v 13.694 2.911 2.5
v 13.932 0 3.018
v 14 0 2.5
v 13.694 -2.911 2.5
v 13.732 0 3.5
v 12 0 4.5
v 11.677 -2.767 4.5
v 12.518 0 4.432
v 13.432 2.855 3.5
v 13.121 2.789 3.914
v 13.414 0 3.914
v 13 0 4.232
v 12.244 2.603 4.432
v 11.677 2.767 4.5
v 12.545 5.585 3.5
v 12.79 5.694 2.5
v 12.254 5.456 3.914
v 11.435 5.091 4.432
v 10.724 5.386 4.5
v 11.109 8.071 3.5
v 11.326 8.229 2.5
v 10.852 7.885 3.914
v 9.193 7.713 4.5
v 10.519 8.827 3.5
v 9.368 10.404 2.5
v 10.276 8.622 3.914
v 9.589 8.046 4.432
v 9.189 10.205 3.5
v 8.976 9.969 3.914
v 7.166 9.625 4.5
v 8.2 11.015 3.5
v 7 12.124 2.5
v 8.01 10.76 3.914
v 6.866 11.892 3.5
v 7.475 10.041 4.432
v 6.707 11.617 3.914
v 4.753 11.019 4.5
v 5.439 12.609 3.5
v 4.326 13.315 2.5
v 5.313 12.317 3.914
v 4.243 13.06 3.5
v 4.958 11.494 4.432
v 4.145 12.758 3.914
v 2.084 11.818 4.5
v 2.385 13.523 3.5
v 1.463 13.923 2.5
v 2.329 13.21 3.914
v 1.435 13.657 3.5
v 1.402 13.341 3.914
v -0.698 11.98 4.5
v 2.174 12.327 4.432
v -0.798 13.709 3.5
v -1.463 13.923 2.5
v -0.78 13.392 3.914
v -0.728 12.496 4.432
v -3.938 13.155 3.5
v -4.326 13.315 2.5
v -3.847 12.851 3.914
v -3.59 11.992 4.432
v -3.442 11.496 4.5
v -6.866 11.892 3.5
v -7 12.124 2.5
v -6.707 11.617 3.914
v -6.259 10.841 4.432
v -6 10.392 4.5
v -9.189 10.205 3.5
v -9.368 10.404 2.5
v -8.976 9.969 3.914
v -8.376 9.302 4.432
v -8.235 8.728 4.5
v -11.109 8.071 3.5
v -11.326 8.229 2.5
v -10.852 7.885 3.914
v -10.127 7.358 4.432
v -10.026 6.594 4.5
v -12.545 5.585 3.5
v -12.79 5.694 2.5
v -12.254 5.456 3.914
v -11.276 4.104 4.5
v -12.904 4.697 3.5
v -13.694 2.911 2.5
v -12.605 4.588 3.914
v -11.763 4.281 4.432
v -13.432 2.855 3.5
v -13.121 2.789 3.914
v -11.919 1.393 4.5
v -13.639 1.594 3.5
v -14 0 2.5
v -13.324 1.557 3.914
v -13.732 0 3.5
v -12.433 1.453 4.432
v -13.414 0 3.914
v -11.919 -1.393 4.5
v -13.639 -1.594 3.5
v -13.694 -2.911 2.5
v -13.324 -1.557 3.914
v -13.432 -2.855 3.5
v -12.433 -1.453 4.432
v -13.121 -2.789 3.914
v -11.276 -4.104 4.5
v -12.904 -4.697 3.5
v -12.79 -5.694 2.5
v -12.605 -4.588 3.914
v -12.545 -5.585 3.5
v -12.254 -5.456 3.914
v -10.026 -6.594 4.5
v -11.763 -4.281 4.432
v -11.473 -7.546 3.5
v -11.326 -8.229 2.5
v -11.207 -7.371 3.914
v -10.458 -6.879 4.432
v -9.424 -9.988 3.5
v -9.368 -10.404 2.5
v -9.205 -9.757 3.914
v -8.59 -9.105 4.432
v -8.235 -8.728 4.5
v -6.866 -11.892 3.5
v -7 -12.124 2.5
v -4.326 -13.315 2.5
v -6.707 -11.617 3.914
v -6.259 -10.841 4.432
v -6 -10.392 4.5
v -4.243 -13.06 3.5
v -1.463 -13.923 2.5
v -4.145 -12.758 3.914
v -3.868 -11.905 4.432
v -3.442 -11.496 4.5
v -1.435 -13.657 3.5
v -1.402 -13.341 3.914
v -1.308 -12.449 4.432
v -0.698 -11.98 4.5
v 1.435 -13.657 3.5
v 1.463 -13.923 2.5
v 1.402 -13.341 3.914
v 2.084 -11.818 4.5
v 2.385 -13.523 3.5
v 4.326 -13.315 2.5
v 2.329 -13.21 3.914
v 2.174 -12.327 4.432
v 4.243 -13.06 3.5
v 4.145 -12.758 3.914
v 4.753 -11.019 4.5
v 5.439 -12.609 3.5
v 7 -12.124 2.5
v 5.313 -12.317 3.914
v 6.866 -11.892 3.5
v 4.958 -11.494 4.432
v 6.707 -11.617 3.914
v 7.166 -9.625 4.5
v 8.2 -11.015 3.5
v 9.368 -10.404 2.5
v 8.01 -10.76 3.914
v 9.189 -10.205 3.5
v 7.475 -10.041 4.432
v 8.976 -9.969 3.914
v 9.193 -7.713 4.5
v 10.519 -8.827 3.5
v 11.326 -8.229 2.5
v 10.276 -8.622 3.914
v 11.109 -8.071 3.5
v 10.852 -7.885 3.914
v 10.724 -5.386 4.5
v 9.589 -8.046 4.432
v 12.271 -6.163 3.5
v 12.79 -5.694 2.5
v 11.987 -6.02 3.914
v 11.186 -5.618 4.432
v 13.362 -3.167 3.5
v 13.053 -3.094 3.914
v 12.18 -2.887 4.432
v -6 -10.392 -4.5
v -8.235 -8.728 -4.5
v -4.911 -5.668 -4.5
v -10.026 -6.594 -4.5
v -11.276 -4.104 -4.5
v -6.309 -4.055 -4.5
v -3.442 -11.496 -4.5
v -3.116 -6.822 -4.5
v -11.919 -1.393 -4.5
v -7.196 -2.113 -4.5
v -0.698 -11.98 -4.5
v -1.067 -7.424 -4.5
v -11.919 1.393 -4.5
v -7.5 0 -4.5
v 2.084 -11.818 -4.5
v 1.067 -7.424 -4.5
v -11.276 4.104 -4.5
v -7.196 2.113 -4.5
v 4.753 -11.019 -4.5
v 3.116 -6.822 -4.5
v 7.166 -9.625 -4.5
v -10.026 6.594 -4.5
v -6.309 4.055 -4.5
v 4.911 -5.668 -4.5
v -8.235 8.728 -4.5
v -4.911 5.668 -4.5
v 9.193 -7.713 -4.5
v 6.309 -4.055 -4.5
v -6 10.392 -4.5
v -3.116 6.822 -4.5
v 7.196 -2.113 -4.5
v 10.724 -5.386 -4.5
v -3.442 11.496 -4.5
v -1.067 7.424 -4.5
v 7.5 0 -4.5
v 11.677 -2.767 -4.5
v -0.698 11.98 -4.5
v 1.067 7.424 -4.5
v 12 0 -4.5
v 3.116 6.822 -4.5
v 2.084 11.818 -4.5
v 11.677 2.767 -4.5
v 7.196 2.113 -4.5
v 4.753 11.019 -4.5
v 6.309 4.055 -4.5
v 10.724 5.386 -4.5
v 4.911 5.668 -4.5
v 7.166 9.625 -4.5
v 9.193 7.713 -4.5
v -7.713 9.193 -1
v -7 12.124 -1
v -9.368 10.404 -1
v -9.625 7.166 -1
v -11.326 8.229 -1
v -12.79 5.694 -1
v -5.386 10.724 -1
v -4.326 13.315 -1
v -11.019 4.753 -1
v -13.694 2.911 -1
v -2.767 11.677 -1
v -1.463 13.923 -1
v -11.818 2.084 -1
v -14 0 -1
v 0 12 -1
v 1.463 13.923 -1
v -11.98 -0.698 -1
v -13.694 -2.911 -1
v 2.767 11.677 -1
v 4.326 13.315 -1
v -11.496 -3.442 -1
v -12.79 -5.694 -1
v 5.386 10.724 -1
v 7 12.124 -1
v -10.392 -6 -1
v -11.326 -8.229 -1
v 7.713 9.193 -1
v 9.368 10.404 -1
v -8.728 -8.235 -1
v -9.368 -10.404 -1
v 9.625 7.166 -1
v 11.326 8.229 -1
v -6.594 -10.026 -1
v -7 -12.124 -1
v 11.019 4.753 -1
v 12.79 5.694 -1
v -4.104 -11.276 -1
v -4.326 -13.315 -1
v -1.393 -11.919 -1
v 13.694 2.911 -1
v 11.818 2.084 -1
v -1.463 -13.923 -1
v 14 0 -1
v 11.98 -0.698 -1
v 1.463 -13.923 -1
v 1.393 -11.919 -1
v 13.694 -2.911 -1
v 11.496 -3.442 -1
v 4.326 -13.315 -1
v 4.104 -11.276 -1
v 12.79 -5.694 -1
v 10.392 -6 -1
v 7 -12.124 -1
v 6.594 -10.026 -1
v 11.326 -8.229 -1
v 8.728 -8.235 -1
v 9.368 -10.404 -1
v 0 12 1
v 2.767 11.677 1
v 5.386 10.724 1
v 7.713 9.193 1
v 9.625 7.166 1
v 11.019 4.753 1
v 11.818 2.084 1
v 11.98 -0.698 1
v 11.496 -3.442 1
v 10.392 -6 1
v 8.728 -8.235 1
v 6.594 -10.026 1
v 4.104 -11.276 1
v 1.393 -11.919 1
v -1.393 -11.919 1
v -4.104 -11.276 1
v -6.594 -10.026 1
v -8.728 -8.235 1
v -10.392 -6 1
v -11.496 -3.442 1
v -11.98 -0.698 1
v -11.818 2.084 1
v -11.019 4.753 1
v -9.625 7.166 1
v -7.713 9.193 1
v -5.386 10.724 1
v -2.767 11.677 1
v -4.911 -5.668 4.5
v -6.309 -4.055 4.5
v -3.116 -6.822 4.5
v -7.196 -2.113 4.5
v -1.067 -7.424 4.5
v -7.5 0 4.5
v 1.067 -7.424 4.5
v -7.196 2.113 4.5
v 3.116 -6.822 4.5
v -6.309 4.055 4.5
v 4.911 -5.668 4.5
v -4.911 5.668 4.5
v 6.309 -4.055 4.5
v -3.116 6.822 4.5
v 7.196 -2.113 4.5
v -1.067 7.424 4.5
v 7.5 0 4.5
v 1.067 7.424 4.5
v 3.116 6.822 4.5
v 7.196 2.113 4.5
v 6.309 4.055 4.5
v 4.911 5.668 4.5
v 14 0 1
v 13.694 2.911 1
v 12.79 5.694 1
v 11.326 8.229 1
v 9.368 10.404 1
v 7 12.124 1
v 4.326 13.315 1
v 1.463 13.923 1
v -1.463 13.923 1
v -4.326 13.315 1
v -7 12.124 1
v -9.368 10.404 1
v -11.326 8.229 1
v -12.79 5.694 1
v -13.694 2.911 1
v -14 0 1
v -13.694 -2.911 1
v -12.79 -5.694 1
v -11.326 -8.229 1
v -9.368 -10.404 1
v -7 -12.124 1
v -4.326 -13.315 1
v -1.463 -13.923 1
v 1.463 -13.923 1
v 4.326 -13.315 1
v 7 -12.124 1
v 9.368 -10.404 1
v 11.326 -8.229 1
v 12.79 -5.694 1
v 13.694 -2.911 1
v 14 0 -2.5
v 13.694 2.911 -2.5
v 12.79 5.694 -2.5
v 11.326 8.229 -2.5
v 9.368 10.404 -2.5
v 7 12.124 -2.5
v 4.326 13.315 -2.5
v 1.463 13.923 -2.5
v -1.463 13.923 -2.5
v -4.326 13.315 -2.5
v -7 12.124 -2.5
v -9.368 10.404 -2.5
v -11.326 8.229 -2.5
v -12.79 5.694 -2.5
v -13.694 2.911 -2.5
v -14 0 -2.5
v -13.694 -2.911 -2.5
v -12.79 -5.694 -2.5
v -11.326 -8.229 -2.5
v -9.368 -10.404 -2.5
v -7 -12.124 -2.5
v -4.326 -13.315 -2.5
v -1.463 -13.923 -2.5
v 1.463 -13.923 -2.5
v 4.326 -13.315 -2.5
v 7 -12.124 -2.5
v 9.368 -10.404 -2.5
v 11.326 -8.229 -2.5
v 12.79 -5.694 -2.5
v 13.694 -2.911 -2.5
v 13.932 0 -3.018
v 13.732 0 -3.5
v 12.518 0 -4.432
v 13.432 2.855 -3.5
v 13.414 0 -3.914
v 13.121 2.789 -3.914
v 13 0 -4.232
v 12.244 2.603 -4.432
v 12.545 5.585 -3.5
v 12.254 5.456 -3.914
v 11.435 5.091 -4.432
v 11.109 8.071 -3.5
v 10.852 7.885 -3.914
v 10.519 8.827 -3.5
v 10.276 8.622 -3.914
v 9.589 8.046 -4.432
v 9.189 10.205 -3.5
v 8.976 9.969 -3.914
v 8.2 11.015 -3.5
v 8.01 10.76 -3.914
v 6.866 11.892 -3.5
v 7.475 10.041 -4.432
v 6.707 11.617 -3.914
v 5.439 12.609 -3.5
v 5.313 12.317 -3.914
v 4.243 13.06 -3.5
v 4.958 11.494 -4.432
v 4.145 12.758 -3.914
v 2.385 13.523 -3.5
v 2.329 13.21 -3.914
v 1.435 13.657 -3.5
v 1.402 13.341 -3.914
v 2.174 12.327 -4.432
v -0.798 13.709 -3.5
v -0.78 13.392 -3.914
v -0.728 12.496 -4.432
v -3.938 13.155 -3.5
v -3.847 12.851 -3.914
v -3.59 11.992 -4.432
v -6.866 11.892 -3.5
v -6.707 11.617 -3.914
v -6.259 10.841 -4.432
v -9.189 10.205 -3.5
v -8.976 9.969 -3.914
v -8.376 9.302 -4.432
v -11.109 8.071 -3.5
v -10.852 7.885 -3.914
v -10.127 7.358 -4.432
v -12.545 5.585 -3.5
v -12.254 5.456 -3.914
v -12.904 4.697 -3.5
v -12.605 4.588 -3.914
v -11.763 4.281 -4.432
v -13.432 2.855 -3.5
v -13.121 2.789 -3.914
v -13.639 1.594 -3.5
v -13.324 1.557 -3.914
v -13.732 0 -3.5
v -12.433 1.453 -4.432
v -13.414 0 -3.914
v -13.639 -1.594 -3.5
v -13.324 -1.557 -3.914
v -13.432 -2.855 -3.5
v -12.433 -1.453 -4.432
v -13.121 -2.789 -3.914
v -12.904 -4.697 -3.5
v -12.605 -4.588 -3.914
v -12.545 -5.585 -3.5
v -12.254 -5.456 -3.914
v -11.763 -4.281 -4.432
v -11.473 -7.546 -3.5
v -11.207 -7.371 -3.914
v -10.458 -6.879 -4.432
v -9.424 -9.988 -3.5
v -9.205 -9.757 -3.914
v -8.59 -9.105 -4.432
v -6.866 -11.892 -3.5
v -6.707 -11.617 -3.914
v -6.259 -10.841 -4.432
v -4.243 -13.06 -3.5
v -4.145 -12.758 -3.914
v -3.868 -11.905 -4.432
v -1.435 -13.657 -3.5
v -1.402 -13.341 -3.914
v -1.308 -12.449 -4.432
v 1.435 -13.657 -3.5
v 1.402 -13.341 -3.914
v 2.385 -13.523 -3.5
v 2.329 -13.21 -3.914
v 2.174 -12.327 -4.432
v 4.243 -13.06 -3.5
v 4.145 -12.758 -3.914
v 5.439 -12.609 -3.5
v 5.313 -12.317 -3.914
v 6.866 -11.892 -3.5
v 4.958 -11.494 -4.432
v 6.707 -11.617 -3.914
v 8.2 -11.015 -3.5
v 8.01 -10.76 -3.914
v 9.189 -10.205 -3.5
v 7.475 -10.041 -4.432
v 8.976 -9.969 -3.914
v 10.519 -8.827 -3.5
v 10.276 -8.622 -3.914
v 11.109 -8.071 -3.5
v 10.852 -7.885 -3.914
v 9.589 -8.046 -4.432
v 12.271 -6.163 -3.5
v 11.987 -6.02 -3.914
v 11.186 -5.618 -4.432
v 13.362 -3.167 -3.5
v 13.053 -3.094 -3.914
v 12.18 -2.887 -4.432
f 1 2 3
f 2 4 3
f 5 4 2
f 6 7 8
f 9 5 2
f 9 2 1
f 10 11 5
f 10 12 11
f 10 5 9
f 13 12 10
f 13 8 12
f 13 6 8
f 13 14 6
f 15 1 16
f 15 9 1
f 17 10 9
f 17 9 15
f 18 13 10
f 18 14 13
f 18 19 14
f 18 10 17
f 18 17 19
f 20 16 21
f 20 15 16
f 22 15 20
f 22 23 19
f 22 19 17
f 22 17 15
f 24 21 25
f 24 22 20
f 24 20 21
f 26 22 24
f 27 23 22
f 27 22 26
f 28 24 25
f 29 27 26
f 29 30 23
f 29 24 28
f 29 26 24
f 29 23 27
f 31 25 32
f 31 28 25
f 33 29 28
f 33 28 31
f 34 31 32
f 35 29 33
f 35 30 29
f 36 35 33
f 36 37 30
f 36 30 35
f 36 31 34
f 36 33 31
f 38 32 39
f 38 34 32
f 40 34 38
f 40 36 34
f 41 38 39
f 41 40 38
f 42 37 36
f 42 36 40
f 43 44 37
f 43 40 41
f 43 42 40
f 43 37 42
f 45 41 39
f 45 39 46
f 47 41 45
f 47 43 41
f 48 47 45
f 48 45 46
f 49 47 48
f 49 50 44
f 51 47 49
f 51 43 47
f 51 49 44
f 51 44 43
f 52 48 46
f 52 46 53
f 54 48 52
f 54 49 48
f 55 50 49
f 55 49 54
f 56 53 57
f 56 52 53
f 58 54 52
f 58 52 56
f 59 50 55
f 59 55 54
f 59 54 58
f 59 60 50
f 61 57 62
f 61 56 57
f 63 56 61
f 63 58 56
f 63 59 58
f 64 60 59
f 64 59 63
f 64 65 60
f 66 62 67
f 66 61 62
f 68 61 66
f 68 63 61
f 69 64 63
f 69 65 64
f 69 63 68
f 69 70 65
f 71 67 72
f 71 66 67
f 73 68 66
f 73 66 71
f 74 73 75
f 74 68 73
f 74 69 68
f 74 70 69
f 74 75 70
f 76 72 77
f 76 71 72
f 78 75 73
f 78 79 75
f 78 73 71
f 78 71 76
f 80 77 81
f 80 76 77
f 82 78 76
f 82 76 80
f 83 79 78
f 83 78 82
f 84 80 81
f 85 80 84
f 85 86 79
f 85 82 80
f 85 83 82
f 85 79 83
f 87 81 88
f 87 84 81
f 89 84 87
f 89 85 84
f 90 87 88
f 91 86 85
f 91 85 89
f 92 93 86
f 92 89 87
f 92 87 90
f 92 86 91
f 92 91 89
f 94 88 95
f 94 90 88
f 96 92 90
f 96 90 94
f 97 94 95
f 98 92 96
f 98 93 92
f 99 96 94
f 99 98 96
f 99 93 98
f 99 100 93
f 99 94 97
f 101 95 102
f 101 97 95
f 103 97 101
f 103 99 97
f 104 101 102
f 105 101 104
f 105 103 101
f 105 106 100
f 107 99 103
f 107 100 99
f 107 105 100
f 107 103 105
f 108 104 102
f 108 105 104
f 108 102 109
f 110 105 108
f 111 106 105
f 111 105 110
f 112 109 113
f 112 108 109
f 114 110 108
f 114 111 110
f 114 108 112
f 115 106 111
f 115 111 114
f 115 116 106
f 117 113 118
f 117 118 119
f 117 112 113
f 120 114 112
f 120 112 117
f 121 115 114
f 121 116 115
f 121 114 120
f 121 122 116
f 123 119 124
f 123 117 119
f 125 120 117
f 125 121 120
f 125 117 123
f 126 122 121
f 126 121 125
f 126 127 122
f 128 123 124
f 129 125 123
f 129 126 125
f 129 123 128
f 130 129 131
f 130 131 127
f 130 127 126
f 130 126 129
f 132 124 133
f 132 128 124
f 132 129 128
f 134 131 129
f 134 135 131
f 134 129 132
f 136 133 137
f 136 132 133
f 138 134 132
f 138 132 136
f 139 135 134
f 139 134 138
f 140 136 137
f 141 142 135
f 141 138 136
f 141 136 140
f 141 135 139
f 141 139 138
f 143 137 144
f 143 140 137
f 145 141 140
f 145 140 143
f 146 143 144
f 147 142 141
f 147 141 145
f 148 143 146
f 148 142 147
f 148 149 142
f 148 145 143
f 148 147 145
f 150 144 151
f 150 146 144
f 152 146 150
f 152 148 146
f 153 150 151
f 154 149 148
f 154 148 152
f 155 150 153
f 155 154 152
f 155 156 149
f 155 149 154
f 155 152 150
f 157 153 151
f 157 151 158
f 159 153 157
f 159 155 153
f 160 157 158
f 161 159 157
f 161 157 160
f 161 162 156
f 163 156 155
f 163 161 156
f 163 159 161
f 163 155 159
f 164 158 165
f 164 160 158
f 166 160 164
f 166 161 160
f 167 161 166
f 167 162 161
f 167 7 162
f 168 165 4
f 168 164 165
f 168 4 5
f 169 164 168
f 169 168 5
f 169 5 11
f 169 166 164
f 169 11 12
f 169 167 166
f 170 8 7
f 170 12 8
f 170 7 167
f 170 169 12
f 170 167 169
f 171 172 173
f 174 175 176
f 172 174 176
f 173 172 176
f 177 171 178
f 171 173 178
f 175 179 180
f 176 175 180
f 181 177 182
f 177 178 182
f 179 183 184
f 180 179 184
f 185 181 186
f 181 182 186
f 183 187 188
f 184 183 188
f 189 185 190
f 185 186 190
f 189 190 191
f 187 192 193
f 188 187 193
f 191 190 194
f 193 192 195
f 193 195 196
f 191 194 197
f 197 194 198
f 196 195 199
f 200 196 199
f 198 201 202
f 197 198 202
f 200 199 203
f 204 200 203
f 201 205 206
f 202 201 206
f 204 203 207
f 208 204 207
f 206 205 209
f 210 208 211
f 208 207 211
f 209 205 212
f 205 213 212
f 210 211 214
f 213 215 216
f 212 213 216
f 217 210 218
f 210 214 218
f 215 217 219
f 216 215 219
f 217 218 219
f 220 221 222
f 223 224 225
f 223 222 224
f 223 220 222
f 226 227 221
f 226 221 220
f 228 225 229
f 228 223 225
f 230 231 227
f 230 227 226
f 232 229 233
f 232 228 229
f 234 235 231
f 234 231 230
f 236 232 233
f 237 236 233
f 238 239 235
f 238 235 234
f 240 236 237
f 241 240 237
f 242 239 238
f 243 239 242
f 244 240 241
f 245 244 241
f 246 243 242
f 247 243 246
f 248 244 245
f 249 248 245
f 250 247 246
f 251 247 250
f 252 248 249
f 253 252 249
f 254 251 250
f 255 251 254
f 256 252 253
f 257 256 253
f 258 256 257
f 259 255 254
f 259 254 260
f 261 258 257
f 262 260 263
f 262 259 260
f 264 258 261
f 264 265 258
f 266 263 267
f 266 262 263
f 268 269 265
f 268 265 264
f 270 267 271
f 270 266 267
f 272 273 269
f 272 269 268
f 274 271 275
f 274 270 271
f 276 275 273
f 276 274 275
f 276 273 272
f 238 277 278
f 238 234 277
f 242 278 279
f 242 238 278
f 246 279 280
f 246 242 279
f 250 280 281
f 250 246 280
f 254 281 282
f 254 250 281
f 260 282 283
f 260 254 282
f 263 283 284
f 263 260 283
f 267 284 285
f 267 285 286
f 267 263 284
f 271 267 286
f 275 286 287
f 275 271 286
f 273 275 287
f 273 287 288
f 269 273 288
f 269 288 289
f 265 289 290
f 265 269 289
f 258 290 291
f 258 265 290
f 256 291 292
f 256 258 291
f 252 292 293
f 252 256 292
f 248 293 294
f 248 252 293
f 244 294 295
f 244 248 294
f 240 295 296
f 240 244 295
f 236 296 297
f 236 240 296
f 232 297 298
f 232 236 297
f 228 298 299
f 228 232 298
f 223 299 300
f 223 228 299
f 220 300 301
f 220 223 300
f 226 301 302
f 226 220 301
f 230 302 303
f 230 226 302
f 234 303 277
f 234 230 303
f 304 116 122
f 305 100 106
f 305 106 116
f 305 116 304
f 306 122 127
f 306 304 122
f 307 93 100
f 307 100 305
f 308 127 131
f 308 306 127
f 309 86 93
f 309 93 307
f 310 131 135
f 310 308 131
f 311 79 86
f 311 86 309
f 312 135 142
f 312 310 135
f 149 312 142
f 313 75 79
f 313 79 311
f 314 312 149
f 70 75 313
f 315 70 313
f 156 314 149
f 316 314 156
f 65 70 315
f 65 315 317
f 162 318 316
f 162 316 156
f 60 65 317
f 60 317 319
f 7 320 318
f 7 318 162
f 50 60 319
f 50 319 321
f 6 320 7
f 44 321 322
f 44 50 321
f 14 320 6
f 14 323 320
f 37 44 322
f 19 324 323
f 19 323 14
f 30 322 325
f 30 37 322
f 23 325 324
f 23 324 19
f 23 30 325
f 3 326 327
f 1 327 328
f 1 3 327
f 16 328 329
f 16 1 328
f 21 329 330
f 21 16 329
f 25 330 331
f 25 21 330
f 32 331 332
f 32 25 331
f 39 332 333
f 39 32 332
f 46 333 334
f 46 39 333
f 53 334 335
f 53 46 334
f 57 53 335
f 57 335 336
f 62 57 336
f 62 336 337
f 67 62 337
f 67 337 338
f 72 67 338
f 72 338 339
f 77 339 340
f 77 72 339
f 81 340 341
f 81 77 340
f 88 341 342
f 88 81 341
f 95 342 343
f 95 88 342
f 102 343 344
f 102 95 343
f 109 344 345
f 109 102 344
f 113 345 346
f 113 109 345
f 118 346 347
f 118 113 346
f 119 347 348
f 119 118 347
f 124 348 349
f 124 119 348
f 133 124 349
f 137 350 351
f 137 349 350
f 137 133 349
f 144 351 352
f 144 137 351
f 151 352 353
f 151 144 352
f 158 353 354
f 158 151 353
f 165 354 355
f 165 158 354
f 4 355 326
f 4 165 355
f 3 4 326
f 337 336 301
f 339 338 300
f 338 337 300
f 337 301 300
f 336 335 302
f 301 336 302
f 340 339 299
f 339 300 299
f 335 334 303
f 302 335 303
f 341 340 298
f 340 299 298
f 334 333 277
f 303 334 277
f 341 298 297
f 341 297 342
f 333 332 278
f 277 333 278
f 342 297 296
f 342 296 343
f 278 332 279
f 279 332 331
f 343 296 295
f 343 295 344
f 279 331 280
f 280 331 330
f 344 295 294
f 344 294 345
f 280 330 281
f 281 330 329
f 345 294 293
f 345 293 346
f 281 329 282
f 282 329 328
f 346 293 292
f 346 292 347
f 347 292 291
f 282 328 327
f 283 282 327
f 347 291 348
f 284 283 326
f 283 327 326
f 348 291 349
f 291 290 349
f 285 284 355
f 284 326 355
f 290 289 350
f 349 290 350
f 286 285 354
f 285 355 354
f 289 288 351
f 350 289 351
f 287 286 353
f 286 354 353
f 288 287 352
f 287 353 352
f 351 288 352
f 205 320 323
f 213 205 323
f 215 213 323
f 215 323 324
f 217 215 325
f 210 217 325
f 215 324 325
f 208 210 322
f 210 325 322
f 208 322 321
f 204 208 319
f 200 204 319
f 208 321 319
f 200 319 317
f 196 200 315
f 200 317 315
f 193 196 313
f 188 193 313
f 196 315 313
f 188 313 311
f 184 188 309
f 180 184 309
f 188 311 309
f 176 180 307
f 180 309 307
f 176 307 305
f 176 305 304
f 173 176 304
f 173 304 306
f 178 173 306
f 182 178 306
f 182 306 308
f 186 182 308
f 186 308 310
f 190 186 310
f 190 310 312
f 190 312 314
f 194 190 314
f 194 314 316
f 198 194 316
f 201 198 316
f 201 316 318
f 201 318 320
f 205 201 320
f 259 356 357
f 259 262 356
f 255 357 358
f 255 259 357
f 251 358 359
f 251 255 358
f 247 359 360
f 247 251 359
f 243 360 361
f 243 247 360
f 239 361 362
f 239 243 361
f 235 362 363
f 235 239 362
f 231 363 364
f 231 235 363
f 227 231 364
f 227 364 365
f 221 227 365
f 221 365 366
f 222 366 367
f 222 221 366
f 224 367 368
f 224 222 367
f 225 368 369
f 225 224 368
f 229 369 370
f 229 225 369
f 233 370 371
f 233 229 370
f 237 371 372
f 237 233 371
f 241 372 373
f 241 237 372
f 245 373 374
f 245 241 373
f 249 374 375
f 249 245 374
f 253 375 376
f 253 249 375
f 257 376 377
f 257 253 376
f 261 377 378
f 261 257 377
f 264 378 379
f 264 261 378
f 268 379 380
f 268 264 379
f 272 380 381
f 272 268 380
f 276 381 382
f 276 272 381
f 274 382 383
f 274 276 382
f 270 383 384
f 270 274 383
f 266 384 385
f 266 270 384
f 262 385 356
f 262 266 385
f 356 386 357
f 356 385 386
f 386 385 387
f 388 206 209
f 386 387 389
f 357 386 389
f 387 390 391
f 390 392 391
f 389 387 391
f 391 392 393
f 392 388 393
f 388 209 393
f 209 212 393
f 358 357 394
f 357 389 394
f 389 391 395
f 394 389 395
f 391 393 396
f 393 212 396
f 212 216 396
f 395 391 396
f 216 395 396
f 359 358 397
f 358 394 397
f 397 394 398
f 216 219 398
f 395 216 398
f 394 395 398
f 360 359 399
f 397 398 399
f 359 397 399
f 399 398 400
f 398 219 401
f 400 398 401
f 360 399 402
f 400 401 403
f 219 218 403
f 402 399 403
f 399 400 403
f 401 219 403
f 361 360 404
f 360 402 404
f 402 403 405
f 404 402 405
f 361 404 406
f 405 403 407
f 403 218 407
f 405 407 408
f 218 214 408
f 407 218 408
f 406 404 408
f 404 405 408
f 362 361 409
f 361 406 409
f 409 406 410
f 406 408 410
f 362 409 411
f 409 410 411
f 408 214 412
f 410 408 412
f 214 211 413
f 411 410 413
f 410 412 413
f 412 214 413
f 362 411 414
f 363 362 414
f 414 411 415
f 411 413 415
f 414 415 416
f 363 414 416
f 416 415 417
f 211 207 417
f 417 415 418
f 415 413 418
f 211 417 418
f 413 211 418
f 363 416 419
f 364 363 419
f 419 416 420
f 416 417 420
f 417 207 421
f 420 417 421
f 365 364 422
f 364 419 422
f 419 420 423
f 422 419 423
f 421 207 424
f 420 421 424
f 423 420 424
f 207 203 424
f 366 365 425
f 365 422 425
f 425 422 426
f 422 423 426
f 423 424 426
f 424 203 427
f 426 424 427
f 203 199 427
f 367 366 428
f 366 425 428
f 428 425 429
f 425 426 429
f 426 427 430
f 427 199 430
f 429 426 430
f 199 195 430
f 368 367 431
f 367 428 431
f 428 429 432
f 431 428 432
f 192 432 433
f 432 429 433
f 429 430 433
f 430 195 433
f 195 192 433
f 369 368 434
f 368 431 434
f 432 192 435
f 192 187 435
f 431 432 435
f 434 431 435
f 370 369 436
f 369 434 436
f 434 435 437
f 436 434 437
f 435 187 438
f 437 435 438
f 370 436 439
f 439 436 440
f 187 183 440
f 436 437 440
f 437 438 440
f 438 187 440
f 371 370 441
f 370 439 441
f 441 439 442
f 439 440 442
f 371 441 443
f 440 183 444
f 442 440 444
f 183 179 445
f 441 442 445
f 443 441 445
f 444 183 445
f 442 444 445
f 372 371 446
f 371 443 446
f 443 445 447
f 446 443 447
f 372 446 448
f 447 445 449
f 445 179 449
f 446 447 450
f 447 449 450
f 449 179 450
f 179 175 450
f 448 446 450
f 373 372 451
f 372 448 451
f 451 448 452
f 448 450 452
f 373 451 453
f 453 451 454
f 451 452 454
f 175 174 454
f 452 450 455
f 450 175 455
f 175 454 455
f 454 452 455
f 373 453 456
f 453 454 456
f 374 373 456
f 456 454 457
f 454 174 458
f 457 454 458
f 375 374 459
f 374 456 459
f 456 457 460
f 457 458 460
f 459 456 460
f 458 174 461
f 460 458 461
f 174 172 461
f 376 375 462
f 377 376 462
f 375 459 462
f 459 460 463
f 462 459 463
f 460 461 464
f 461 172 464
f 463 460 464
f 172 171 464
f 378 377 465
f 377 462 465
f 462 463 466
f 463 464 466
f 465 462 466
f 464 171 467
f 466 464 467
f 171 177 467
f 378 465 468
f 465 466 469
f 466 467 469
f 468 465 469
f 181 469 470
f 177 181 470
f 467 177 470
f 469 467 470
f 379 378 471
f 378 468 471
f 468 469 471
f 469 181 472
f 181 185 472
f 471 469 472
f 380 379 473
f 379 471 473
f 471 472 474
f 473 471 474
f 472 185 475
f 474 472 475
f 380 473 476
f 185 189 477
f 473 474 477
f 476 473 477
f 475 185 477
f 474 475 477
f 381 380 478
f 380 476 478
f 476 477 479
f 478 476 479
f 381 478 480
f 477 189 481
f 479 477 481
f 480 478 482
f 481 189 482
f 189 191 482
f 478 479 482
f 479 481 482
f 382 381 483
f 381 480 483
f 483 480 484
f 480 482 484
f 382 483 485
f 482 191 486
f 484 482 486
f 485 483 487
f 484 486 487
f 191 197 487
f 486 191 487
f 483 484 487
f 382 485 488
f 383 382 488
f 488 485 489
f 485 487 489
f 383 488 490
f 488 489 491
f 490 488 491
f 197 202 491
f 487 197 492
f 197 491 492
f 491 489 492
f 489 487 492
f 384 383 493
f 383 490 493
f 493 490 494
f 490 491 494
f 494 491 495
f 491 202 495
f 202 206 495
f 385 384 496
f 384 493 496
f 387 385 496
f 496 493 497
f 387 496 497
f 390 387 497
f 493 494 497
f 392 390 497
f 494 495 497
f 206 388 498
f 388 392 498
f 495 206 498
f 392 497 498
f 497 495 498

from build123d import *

# Parameters (mm, degrees)
ESQUISSE1_R             = 14
BOSS_EXTRU_1_DEPTH      = 4.5
CONG_1_R                = 2
ESQUISSE14_W            = 2
ESQUISSE14_H            = 2
ESQUISSE15_R            = 7.5
ENL_V_MAT_EXTRU_2_DEPTH = 10


with BuildPart() as part:
    # Esquisse1 → Boss.-Extru.1 (new body, symmetric)
    with BuildSketch(Plane.XY):
        Circle(ESQUISSE1_R)
    extrude(amount=BOSS_EXTRU_1_DEPTH, both=True)

    # Congé1
    cong_1_edges = [part.edges().sort_by_distance(p)[0] for p in [
        (-14, 0, -4.5),
        (-14, 0, 4.5),
    ]]
    fillet(cong_1_edges, radius=CONG_1_R)

    # Esquisse14 → Enlèvement de matière-Révolution2 (revolve, cut)
    with BuildSketch(Plane(origin=(0, 0, 0), x_dir=(0, 0, -1), z_dir=(1, 0, 0))):
        with Locations((0, 13)):
            Rectangle(ESQUISSE14_W, ESQUISSE14_H)
    revolve(axis=Axis((0, 0, 11.517879347), (0, 0, -1)), mode=Mode.SUBTRACT)

    # Esquisse15 → Enlèv. mat.-Extru.2 (cut, through all)
    with BuildSketch(Plane.XY.offset(4.5)):
        Circle(ESQUISSE15_R)
    extrude(amount=-ENL_V_MAT_EXTRU_2_DEPTH, mode=Mode.SUBTRACT)


solid = part.part
